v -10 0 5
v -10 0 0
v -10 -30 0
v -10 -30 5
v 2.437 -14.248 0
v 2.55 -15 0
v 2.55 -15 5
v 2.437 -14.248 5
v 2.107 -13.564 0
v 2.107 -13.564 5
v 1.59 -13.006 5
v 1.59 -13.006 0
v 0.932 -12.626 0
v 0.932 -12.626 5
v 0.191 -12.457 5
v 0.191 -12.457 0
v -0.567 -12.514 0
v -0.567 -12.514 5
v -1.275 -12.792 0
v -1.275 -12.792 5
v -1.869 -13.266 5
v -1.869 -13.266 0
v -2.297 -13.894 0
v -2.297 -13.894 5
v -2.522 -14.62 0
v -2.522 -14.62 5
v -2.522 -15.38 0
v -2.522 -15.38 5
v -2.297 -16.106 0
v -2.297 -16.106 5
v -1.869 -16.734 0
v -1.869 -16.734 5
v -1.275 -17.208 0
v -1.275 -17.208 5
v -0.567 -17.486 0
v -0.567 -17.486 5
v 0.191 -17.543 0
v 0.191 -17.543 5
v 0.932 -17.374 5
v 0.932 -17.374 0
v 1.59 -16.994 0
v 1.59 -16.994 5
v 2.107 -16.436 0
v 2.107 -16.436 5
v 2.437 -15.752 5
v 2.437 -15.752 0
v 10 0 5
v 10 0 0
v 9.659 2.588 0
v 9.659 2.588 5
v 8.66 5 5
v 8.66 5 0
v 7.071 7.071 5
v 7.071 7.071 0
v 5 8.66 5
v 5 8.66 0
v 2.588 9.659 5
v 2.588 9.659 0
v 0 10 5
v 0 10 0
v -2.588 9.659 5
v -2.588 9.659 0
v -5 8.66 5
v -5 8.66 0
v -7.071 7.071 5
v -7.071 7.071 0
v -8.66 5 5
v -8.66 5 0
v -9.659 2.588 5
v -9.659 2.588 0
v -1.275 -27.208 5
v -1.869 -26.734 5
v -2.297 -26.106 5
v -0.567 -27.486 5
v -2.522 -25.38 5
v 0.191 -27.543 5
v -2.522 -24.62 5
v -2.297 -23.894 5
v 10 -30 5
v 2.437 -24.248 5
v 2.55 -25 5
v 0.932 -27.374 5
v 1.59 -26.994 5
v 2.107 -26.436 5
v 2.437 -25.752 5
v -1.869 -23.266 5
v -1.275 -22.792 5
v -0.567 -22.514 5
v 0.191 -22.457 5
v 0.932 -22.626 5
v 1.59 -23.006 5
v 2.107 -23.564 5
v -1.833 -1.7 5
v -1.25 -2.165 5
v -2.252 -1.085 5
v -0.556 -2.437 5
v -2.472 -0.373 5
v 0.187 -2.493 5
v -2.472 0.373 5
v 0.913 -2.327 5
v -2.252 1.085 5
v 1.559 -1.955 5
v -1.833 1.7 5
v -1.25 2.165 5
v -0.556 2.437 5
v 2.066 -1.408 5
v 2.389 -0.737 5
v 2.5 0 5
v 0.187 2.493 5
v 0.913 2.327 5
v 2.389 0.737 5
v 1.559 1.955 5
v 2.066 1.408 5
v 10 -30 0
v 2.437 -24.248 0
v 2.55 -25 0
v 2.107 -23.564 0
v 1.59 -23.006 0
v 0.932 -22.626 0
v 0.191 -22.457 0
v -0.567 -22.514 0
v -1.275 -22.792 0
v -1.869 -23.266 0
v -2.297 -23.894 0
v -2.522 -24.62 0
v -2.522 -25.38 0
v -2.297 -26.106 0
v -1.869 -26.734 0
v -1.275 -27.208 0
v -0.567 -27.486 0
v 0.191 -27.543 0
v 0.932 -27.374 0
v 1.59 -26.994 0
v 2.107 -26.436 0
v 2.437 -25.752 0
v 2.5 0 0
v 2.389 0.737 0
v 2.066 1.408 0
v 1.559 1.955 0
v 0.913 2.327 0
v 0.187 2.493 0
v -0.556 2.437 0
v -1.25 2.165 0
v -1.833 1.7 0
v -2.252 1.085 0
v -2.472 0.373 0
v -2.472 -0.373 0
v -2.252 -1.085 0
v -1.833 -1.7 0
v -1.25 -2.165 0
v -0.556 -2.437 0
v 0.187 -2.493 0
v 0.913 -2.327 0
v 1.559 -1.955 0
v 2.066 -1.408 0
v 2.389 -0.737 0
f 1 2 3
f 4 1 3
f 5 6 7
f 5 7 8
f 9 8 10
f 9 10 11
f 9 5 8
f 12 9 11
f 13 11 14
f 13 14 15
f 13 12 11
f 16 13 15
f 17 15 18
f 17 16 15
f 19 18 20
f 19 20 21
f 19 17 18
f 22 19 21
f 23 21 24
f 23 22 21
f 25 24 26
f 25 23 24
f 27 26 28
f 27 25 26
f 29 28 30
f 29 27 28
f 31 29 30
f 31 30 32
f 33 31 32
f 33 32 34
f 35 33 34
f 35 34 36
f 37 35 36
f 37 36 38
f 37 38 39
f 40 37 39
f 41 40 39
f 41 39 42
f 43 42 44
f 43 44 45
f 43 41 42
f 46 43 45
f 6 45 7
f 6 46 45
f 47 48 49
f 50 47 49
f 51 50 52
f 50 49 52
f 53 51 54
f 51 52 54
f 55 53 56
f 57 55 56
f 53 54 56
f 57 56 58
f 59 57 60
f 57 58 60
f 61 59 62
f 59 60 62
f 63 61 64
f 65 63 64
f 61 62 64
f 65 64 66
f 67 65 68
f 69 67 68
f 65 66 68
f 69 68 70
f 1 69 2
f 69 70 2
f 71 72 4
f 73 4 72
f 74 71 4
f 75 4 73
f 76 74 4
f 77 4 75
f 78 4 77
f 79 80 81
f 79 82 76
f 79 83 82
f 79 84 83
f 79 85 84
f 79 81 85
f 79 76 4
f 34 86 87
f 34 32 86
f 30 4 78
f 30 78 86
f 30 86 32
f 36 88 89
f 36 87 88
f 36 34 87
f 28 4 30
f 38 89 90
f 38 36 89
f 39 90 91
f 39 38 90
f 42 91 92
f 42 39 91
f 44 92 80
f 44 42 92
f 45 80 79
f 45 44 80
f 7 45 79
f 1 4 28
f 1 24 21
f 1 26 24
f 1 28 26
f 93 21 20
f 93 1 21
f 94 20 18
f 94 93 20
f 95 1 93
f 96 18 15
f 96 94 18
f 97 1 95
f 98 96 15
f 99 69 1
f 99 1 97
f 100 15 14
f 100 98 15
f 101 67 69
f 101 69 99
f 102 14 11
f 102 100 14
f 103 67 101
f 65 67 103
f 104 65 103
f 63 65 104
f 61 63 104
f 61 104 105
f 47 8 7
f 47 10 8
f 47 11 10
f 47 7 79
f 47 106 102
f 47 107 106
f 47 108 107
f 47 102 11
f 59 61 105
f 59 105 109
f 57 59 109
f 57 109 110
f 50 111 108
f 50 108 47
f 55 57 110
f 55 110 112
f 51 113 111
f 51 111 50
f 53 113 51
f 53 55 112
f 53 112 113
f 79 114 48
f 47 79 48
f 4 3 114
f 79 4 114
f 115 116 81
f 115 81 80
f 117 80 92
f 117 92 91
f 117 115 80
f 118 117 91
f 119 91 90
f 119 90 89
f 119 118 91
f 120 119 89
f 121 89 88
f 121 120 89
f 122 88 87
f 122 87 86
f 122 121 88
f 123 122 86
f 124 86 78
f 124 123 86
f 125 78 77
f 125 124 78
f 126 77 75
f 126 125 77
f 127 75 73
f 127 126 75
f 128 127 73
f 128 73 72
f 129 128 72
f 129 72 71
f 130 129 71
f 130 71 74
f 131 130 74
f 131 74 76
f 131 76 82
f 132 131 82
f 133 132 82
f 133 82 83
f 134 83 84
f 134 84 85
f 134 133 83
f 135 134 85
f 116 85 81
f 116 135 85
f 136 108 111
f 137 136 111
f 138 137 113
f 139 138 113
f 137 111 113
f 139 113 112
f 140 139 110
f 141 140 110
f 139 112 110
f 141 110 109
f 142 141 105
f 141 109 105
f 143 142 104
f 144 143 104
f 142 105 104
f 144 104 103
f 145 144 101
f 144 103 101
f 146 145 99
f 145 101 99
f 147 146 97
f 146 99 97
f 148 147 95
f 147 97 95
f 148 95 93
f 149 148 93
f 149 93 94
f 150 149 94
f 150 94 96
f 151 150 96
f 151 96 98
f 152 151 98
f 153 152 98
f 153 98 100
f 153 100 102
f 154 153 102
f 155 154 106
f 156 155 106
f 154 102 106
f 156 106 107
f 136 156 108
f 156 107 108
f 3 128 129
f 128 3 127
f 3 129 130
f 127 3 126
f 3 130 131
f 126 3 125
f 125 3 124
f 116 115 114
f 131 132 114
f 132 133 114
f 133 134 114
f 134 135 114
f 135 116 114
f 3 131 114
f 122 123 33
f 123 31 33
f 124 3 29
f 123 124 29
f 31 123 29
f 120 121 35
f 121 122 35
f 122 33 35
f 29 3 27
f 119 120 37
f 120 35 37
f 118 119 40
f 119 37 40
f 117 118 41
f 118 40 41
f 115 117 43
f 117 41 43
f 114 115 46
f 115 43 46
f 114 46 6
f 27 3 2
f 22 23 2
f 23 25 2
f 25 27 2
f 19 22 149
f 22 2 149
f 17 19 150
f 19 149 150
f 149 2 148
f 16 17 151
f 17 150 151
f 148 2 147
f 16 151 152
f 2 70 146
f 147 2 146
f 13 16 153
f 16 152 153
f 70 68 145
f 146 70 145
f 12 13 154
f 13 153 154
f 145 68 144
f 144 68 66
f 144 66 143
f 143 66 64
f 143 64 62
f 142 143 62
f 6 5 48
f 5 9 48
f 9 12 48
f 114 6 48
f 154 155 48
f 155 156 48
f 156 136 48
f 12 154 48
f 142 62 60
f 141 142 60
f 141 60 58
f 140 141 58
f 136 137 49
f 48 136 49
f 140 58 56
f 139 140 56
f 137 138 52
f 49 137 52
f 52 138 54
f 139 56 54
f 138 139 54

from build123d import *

# Parameters (mm, degrees)
SKETCH1_R           = 2.55
BOSS_EXTRUDE1_DEPTH = 5
SKETCH2_R           = 2.5
CUT_EXTRUDE1_DEPTH  = 5


with BuildPart() as part:
    # Sketch1 → Boss-Extrude1 (new body)
    with BuildSketch(Plane.XY):
        with BuildLine():
            Line((-10, 0), (-10, -30))
            Line((-10, -30), (10, -30))
            Line((10, -30), (10, 0))
            ThreePointArc((10, 0), (0, 10), (-10, 0))
        make_face()
        with Locations((0, -25)):
            Circle(SKETCH1_R, mode=Mode.SUBTRACT)
        with Locations((0, -15)):
            Circle(SKETCH1_R, mode=Mode.SUBTRACT)
    extrude(amount=BOSS_EXTRUDE1_DEPTH)

    # Sketch2 → Cut-Extrude1 (cut)
    with BuildSketch(Plane.XY.offset(5)):
        Circle(SKETCH2_R)
    extrude(amount=-CUT_EXTRUDE1_DEPTH, mode=Mode.SUBTRACT)


solid = part.part
